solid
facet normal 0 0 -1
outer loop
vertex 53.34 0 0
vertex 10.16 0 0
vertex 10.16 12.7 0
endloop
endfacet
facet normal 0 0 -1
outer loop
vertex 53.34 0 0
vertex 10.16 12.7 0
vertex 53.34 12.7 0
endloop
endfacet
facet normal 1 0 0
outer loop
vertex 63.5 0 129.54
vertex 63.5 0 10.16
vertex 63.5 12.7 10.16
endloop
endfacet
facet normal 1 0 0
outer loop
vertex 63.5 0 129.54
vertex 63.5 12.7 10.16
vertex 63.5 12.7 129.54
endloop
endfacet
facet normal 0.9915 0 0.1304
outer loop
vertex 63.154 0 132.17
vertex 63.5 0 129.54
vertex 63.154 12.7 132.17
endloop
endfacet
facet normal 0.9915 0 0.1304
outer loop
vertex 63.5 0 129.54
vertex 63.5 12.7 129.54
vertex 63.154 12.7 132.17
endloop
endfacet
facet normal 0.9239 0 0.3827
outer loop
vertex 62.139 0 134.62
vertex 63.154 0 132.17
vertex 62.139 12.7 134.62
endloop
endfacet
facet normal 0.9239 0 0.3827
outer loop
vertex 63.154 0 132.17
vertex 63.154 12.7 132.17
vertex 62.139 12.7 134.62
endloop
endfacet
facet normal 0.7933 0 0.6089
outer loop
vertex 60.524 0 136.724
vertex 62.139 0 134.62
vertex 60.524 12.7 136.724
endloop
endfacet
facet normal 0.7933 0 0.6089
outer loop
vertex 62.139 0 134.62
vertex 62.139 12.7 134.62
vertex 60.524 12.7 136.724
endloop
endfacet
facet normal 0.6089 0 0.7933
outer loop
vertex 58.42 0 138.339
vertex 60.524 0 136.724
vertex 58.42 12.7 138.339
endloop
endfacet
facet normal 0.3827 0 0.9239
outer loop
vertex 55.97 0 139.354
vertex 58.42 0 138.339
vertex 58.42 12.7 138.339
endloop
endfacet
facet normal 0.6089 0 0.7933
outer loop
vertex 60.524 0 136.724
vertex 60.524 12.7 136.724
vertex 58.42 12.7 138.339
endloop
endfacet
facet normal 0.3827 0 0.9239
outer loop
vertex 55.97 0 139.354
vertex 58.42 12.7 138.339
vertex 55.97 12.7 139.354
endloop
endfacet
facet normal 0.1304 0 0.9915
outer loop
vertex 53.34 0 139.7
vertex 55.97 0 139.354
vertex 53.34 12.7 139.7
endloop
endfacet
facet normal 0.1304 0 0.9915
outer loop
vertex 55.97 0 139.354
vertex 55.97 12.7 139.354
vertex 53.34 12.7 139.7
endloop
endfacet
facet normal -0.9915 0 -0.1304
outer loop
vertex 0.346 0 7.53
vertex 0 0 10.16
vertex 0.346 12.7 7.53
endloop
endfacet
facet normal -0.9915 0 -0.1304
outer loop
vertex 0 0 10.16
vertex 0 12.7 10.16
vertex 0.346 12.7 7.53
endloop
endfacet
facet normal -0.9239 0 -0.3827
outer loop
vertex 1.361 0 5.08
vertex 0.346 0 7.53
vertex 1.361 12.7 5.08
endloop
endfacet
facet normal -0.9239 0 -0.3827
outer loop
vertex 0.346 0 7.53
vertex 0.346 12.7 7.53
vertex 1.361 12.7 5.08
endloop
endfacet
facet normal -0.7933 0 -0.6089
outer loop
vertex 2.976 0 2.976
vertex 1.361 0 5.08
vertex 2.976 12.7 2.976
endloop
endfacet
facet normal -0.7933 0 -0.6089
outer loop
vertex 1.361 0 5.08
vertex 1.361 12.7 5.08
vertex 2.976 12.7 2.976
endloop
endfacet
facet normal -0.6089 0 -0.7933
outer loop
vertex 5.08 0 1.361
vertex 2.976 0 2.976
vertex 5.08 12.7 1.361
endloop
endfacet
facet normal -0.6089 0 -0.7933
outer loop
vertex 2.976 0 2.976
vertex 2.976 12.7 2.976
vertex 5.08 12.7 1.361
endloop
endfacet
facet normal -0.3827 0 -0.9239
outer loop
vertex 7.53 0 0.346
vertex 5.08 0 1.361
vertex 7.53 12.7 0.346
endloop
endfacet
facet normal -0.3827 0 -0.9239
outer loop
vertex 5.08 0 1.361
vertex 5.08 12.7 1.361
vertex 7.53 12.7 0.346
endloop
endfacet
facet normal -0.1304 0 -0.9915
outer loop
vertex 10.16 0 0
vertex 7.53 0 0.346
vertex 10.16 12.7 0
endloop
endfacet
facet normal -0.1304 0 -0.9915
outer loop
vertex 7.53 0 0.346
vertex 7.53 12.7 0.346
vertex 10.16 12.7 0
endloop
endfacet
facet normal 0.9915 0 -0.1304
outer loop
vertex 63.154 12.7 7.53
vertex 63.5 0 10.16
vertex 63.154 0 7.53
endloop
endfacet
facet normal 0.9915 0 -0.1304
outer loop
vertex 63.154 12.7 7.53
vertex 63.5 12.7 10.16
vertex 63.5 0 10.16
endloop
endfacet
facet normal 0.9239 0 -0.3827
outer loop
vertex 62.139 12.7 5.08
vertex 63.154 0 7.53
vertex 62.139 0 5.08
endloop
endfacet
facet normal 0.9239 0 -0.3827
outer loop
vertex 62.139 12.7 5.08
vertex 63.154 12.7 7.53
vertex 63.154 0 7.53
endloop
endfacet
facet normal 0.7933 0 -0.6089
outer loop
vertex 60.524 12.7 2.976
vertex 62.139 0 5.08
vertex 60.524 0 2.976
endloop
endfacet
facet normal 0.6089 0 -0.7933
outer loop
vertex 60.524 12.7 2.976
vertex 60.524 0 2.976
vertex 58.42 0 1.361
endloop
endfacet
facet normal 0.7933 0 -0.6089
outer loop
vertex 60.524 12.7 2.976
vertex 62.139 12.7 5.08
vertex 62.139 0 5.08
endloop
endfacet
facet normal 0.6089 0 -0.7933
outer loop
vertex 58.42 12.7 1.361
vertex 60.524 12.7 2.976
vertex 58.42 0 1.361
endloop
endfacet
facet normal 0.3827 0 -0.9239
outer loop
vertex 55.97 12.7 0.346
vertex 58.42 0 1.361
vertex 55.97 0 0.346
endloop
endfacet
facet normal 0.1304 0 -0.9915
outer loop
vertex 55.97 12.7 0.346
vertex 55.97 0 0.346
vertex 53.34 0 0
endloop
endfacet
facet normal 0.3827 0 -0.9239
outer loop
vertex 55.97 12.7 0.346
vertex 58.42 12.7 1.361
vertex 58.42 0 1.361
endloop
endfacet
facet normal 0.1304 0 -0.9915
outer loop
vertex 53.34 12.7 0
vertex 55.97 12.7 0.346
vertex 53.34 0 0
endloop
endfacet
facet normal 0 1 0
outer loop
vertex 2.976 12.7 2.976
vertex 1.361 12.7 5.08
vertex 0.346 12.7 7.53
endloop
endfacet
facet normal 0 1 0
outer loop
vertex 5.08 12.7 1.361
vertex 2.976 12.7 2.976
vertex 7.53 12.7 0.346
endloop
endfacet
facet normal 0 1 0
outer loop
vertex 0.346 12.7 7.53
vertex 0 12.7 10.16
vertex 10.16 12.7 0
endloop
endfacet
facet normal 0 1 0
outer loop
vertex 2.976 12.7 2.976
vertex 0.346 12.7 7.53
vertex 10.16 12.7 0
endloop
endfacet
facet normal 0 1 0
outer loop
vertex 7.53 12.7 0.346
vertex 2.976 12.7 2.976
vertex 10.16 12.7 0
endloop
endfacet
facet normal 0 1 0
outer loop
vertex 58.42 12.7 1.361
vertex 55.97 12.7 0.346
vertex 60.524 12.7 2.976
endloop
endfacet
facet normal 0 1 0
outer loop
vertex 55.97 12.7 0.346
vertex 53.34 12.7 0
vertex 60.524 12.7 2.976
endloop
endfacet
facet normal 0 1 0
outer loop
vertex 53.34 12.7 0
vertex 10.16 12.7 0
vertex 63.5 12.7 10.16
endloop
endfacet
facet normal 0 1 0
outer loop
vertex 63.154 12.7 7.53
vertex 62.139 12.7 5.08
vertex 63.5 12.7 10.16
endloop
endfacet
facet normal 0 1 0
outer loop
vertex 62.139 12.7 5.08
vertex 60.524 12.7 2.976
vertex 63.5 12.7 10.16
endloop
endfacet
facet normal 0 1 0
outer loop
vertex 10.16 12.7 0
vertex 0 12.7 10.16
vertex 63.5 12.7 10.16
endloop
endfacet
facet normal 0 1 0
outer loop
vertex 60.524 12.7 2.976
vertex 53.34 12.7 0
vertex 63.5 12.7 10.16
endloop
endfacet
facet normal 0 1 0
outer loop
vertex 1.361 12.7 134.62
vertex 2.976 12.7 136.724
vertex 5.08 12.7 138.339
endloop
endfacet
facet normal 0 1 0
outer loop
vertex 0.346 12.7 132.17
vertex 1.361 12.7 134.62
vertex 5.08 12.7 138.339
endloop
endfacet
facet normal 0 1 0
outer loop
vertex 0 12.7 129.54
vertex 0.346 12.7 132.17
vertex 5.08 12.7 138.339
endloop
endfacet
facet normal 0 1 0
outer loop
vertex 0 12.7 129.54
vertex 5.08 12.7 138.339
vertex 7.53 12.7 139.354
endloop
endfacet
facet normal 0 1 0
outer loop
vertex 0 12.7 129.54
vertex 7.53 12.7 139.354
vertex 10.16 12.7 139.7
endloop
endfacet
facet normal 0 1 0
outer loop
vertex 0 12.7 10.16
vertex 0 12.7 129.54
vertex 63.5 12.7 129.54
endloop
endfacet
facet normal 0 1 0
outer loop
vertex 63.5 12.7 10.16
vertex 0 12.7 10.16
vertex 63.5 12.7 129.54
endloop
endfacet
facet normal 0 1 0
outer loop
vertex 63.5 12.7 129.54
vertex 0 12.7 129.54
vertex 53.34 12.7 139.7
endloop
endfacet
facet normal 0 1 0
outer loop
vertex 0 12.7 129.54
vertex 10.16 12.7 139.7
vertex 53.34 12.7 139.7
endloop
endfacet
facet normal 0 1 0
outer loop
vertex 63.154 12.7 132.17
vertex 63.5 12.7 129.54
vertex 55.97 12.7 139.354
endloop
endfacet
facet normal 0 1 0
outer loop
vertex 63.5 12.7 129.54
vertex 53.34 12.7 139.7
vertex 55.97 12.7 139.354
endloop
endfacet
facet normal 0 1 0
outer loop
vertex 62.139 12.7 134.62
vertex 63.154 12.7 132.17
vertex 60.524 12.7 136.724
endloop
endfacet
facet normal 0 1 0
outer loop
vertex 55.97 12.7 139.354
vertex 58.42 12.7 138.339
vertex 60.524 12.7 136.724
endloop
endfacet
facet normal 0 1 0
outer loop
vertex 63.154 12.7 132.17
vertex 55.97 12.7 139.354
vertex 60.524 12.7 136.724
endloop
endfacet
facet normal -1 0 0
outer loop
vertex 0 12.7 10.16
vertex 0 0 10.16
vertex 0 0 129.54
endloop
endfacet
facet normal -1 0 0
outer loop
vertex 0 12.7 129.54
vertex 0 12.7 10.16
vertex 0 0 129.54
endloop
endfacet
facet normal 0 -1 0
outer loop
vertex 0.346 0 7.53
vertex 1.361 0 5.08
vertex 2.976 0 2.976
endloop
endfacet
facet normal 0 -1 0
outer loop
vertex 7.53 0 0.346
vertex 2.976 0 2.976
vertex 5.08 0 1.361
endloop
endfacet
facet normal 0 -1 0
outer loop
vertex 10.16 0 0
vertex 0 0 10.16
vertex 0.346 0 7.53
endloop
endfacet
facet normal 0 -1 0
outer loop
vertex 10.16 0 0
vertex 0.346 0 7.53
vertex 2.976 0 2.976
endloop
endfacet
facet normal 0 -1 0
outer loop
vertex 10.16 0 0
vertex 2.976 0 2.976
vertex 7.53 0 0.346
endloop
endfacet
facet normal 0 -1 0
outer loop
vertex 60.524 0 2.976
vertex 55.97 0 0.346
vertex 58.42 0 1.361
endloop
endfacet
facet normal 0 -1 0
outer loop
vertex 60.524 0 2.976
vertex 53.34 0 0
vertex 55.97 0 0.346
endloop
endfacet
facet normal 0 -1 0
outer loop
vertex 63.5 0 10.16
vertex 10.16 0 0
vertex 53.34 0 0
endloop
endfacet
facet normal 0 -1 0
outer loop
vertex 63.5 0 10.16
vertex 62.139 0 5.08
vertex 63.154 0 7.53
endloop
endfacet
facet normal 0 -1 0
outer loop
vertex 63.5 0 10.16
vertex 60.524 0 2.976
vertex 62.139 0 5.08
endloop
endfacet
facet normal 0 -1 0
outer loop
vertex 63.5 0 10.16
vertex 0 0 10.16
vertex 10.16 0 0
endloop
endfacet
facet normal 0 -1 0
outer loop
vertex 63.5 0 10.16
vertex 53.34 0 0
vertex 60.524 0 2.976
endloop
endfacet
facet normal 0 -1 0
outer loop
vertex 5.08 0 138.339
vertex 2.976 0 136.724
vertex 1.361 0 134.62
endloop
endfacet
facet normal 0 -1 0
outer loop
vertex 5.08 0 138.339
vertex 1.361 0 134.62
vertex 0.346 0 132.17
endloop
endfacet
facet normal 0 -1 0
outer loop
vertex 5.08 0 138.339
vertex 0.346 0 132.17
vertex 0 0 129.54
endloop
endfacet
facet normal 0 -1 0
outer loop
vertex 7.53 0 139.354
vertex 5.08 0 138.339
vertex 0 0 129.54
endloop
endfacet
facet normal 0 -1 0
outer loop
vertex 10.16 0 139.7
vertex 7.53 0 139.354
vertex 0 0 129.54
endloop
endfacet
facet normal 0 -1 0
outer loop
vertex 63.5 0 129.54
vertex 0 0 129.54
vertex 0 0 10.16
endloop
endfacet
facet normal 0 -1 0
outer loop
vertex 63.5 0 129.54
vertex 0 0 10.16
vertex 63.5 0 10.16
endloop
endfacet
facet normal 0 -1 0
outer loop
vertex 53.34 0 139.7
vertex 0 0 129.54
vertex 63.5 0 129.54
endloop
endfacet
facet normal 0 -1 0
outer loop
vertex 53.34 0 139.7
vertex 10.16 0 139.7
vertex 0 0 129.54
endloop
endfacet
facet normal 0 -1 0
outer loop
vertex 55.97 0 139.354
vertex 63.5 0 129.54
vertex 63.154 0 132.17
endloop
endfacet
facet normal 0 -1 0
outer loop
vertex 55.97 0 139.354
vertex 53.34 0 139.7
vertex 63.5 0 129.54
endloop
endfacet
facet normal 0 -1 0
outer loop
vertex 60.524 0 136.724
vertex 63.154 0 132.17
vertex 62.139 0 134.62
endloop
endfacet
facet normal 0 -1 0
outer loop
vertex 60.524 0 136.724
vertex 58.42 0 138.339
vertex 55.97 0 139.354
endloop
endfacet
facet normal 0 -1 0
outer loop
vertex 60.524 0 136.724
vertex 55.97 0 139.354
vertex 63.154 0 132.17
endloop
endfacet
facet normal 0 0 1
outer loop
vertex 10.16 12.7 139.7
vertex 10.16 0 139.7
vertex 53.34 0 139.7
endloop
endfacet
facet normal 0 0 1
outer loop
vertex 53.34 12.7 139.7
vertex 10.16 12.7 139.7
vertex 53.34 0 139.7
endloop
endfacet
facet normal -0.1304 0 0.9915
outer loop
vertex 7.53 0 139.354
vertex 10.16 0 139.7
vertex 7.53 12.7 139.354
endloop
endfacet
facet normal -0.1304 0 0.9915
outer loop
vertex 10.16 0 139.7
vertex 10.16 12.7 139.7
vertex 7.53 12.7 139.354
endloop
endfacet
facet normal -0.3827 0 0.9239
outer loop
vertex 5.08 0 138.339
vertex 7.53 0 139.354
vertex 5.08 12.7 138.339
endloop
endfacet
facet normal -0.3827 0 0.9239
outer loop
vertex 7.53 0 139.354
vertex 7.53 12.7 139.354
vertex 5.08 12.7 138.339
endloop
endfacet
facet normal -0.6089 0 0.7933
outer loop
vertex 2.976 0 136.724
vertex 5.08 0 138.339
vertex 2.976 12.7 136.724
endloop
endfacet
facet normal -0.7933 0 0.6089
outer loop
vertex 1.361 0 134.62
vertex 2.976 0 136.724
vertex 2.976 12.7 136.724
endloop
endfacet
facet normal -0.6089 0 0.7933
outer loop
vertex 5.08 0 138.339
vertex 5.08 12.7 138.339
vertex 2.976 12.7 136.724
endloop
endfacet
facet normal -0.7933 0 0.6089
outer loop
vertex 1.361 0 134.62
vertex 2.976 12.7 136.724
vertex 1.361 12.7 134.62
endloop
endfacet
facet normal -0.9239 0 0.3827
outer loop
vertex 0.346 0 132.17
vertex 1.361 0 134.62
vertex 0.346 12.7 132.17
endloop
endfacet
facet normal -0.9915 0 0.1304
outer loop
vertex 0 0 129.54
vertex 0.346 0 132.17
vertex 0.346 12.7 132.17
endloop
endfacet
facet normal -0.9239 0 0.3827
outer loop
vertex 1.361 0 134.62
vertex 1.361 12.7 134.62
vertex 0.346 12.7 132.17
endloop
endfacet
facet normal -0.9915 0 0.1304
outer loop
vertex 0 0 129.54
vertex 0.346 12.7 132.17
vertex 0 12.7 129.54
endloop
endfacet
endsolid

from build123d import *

# Parameters (mm, degrees)
F0_W     = 63.5
F0_H     = 139.7
F1_DEPTH = 12.7
F2_R     = 10.16
F3_R     = 10.16
F4_R     = 10.16
F5_R     = 10.16


with BuildPart() as f1:
    # F0 (on Front) → F1 (new body)
    with BuildSketch(Plane.XZ):
        with Locations((31.75, 69.85)):
            Rectangle(F0_W, F0_H)
    extrude(amount=-F1_DEPTH)

    # F2
    f2_edges = [f1.edges().sort_by_distance(p)[0] for p in [
        (63.5, 6.35, 139.7),
    ]]
    fillet(f2_edges, radius=F2_R)

    # F3
    f3_edges = [f1.edges().sort_by_distance(p)[0] for p in [
        (63.5, 6.35, 0),
    ]]
    fillet(f3_edges, radius=F3_R)

    # F4
    f4_edges = [f1.edges().sort_by_distance(p)[0] for p in [
        (0, 6.35, 139.7),
    ]]
    fillet(f4_edges, radius=F4_R)

    # F5
    f5_edges = [f1.edges().sort_by_distance(p)[0] for p in [
        (0, 6.35, 0),
    ]]
    fillet(f5_edges, radius=F5_R)


solid = f1.part
